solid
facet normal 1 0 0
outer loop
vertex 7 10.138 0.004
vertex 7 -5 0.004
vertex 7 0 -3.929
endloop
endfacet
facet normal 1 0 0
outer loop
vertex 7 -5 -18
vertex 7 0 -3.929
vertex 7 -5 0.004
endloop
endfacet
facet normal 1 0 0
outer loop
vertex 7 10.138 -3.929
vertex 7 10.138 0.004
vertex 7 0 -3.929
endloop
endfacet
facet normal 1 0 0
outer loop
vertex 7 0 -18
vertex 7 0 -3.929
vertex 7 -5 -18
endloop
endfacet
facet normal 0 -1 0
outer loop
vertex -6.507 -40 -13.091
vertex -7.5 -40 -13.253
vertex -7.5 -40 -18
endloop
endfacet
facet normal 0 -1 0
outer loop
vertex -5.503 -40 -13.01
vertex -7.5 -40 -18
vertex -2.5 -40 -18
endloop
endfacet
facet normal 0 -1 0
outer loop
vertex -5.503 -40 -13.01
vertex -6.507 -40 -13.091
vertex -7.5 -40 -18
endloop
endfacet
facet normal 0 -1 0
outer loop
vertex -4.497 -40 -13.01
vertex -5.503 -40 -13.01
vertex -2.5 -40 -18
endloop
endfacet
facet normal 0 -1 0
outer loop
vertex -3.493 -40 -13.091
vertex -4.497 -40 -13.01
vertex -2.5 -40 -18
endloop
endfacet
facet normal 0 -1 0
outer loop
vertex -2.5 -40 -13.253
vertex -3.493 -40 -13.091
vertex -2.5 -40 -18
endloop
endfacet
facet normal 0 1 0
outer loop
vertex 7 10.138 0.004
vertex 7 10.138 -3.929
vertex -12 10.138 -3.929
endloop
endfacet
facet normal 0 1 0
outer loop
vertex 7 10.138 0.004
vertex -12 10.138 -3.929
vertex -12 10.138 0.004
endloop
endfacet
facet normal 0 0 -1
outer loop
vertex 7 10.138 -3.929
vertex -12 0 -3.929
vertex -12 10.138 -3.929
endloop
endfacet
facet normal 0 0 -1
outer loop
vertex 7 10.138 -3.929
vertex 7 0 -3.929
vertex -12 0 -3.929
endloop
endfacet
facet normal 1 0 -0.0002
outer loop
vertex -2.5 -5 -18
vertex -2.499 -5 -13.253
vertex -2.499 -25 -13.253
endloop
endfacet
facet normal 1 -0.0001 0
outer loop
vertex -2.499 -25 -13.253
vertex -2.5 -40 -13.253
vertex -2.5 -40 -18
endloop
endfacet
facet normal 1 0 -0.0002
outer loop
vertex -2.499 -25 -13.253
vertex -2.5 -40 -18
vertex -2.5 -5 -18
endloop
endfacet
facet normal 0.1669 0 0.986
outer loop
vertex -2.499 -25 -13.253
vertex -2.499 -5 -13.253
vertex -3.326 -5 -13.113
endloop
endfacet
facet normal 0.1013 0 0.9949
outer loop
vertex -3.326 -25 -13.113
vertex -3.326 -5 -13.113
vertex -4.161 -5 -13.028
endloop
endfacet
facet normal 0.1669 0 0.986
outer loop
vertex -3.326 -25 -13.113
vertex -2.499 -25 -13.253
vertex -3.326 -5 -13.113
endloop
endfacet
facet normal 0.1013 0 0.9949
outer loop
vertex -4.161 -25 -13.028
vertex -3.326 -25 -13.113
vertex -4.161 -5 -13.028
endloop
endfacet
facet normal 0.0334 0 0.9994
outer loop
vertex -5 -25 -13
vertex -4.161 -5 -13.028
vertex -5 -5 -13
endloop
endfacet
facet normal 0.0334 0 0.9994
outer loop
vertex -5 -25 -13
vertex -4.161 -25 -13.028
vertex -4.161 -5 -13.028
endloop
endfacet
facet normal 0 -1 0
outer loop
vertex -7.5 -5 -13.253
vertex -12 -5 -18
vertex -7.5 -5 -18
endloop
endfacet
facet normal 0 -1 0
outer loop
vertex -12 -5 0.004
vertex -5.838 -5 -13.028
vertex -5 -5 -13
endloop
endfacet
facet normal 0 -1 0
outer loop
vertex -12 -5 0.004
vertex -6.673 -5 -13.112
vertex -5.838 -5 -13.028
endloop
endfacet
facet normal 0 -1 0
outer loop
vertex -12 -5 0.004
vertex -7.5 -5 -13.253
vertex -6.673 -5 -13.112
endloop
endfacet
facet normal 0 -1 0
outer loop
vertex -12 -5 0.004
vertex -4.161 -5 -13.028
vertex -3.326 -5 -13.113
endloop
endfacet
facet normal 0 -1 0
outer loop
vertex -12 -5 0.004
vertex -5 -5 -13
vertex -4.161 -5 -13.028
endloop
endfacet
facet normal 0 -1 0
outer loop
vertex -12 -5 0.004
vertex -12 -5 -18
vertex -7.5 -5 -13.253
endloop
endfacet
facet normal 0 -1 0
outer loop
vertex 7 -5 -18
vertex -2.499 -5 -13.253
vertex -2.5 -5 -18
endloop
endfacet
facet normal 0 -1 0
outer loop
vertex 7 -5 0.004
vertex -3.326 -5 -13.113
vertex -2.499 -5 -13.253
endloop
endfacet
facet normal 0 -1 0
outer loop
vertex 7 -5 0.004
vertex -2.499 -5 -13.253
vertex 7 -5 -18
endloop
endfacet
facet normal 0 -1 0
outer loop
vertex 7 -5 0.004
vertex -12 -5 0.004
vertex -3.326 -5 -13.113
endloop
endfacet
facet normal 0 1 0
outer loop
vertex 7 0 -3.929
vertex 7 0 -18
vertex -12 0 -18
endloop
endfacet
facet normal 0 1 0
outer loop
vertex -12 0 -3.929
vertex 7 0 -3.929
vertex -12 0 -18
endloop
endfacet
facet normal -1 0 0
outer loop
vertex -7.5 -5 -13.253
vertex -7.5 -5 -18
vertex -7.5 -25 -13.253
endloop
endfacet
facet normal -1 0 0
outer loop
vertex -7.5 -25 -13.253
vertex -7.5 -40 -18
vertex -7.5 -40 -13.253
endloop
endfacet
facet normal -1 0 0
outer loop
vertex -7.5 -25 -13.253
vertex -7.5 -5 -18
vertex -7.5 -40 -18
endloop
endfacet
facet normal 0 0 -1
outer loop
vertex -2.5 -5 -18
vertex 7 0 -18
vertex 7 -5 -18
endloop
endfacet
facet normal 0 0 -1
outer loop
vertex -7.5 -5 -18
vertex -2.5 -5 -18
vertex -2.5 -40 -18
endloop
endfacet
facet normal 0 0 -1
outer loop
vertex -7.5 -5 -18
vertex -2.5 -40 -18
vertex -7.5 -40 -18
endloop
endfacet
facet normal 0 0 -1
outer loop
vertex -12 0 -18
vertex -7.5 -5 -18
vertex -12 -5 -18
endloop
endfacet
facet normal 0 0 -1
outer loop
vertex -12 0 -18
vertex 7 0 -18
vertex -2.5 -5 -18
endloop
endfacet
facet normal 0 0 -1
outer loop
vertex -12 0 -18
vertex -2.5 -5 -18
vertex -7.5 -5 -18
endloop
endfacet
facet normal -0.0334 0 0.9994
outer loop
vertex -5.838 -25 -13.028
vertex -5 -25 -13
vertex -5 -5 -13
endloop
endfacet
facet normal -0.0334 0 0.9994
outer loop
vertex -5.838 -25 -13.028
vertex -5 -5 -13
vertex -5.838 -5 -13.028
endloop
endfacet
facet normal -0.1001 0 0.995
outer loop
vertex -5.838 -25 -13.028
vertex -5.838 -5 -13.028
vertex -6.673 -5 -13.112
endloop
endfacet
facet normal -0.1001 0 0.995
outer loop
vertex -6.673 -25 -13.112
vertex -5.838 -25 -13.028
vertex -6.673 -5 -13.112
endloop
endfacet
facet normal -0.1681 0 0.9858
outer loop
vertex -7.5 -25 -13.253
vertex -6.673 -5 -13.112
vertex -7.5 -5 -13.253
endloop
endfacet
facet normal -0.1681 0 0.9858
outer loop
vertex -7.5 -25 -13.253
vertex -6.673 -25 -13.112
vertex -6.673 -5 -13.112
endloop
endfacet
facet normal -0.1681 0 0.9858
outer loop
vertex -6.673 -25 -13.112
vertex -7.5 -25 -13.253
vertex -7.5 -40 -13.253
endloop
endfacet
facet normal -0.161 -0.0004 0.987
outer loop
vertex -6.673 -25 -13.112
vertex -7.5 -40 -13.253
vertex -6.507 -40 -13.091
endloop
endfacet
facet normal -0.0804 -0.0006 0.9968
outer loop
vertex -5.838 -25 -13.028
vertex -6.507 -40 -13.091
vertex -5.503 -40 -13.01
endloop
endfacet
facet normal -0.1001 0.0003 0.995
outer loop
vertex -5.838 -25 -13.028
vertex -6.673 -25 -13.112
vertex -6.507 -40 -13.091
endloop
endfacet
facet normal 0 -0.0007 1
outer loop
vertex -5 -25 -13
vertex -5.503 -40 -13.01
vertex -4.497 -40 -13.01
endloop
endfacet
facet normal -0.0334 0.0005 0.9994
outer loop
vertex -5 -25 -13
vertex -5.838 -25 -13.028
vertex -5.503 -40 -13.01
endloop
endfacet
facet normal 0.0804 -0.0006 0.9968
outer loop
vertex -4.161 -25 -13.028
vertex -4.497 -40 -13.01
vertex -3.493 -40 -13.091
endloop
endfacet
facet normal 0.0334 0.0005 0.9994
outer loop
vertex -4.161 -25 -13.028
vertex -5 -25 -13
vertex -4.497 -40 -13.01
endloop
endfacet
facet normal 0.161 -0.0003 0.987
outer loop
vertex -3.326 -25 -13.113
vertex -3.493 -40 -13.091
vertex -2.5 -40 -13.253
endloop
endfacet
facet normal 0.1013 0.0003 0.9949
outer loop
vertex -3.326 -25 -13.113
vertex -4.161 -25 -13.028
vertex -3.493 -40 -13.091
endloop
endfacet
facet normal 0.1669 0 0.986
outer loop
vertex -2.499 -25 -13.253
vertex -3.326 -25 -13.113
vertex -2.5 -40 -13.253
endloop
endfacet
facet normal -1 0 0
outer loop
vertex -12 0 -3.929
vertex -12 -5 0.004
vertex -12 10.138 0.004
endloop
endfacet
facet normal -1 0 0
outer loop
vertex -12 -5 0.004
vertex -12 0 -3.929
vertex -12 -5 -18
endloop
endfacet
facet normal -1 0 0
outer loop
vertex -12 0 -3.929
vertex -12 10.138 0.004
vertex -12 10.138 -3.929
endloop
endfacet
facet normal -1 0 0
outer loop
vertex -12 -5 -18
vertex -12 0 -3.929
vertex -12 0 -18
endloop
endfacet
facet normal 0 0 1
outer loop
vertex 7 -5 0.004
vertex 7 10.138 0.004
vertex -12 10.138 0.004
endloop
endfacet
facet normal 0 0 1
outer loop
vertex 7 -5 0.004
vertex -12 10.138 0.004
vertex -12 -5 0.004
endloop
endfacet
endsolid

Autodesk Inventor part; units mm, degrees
ref_plane "YZ Plane" through (0, 0, 0) normal (1, 0, 0) x (0, 1, 0)
ref_plane "XZ Plane" through (0, 0, 0) normal (0, 1, 0) x (-1, 0, 0)
ref_plane "XY Plane" through (0, 0, 0) normal (0, 0, 1) x (1, 0, 0)
sketch "Sketch1" plane through (0, 0, 0) normal (0, 1, 0) x (-1, 0, 0)
  line L0 (0, 0) -> (0, -13)
  line L1 (0, -13) -> (-2, -13)
  line L2 (-2, -13) -> (-2, 2)
  line L3 (-2, 2) -> (12, 2)
  line L4 (12, 2) -> (12, -13)
  line L5 (12, -13) -> (10, -13)
  line L6 (10, -13) -> (10, 0)
  line L7 (10, 0) -> (0, 0)
  dimension "d0" = 13
  dimension "d1" = 2
  dimension "d2" = 15
  dimension "d3" = 14
  dimension "d4" = 2
  dimension "d5" = 13
ref_plane "Work Plane2" through (-12, 0, 2) normal (0, 0, 1) x (1, 0, 0)
sketch "Sketch2" plane through (-12, 0, 2) normal (0, 0, 1) x (1, 0, 0)
  line L0 (0, 20) -> (14, 20) projected
  line L1 (7, 20) -> (7, 0)
  line L2 (12, 0) -> (2, 0) projected
  line L3 (7, 0) -> (7, 4.5)
  circle A0 centre (7, 4.5) radius 1.75
  line L4 (7, 4.5) -> (7, 15.5)
  circle A1 centre (7, 15.5) radius 1.75
  dimension "d8" = 4.5
  dimension "d9" = 3.5
  dimension "d10" = 11
  dimension "d11" = 3.5
ref_plane "Work Plane5" through (0, 0, 0) normal (0, -1, 0) x (1, 0, 0)
sketch "Sketch3" plane through (0, 0, 0) normal (0, -1, 0) x (1, 0, 0)
  line L0 (-12, 2) -> (2, 2) projected
  line L1 (-12, -13) -> (-12, 2) projected
  line L2 (2, 2) -> (-12, 2)
  line L3 (-12, 2) -> (-12, -13)
  line L4 (-12, -13) -> (2, -13)
  line L5 (2, -13) -> (2, 2)
  point P0 (0, 0)
extrude "Extrusion3" add sketch "Sketch3" along normal blind 5
ref_plane "Work Plane6" through (0, -5, 0) normal (0, -1, 0) x (1, 0, 0)
sketch "Sketch4" plane through (0, -5, 0) normal (0, -1, 0) x (1, 0, 0)
  line L0 (-12, -13) -> (2, -13) projected
  line L1 (2, -13) -> (-12, -13)
  line L2 (-12, -13) -> (-12, -8)
  line L3 (-12, -8) -> (2, -8)
  line L4 (2, -8) -> (2, -13)
  point P0 (0, 0)
  dimension "d16" = 14
  dimension "d17" = 5
ref_plane "Work Plane1" through (0, -25, 0) normal (0, -1, 0) x (1, 0, 0)
sketch "Sketch5" plane through (0, -25, 0) normal (0, -1, 0) x (1, 0, 0)
  line L0 (2, -8) -> (2, -13) projected
  line L1 (-12, -13) -> (2, -13) projected
  line L2 (-5, -13) -> (-5, 2)
  line L3 (2, 2) -> (-12, 2) projected
  line L4 (-5, -13) -> (-2.5, -13)
  line L5 (-10, -13) -> (0, -13) projected
  line L6 (-2.5, -13) -> (-2.5, -18)
  line L7 (-2.5, -18) -> (-7.5, -18)
  line L8 (-7.5, -18) -> (-7.5, -13)
  line L9 (-2.5, -13) -> (-7.5, -13)
  line L10 (-5, -13) -> (-5, -25.5)
  arc A0 (-2.4988, -13.2528) -> (-5, -13) centre (-5, -25.5) ccw
  arc A1 (-5, -13) -> (-7.5, -13.2526) centre (-5, -25.5) ccw
  point P0 (0, 0)
  point P1 (-2.5, -13.2526)
  dimension "d25" = 2.5
  dimension "d26" = 5
  dimension "d27" = 5
  dimension "d31" = 12.5
extrude "Extrusion4" add sketch "Sketch5" against normal blind 20 contours A0 L6 L7 L10 | L10 L7 L8 A1
ref_plane "Work Plane3" through (2, 20, -13) normal (0, 0, -1) x (-1, 0, 0)
sketch "Sketch6" plane through (2, 20, -13) normal (0, 0, -1) x (-1, 0, 0)
  line L0 (0, -25) -> (0, 0) projected
  line L1 (14, -25) -> (7, -25) projected
  line L2 (0, -20) -> (14, -20)
  line L3 (14, -20) -> (14, -25)
  line L4 (14, -25) -> (0, -25)
  line L5 (0, -25) -> (0, -20)
  point P0 (2, -20)
  point P1 (9.5, -25)
  point P2 (9.5, -25)
extrude "Extrusion5" add sketch "Sketch6" along normal up to surface (5 mm away)
ref_plane "Work Plane4" through (-10, 20, -13) normal (0, 0, -1) x (-1, 0, 0)
sketch "Sketch9" plane through (0, -25, 0) normal (0, -1, 0) x (1, 0, 0)
  arc A0 (-2.5, -13.2526) -> (-7.5, -13.2526) centre (-5, -25.5) ccw projected
  line L0 (-7.5, -13.2526) -> (-7.5, -18) projected
  line L1 (-7.5, -18) -> (-2.5, -18) projected
  line L2 (-2.5, -18) -> (-2.5, -13.2526) projected
  line L3 (-2.5, -18) -> (-2.5, -13.2526)
  line L4 (-2.5, -11.2171) -> (-2.5, -18) projected
  line L5 (-2.5, -18) -> (-7.5, -18)
  line L6 (2, -18) -> (-12, -18) projected
  line L7 (-7.5, -18) -> (-7.5, -13.2526)
  point P0 (0, 0)
extrude "Extrusion7" add sketch "Sketch9" along normal blind 15
sketch "Sketch11" plane through (2, 0, -18) normal (0, 0, -1) x (-1, 0, 0)
  line L0 (9.5, -5) -> (9.5, -40) projected
  line L1 (14, -5) -> (9.5, -5) projected
  line L2 (14, 0) -> (14, -5) projected
  line L3 (0, 0) -> (14, 0) projected
  line L4 (0, -5) -> (0, 0) projected
  line L5 (4.5, -5) -> (0, -5) projected
  line L6 (4.5, -5) -> (4.5, -40) projected
  line L7 (9.5, -40) -> (4.5, -40) projected
  line L8 (9.5, -5) -> (4.5, -5)
  line L9 (0, -5) -> (14, -5) projected
  line L10 (0, -5) -> (-5, -5)
  line L11 (-5, -5) -> (-5, 0)
  line L12 (0, -5) -> (0, 0) projected
  line L13 (-5, 0) -> (0, 0)
  line L14 (14, -5) -> (19, -5)
  line L15 (19, -5) -> (19, 0)
  line L16 (19, 0) -> (14, 0)
  point P0 (2, 0)
  dimension "d39" = 5
  dimension "d40" = 5
extrude "Extrusion9" add sketch "Sketch11" against normal up to surface (20 mm away) contours L10 L11 L13 L4
sketch "Sketch12" plane through (7, -5, -18) normal (1, 0, 0) x (0, 0, -1)
  line L0 (-14.0041, 5.1427) -> (-14.0041, 5) construction
  line L1 (-20, 5) -> (0, 5) construction
  line L2 (-14.0041, 5) -> (-18.0041, 5) construction
  line L3 (-20, 0) -> (0, 0) projected
  line L4 (-18.0041, 5) -> (-20, 5)
  line L5 (-20, 5) -> (-20, 0)
  line L6 (-20, 0) -> (-18.0041, 0)
  line L7 (-18.0041, 0) -> (-18.0041, 5)
  point P0 (-18, 5)
  dimension "d43" = 4
extrude "Extrusion10" cut sketch "Sketch12" against normal through all
sketch "Sketch13" plane through (7, -5, -18) normal (1, 0, 0) x (0, 0, -1)
  line L0 (0, 5) -> (-18.0041, 5) projected
  line L1 (-18.0041, 5) -> (-14.0707, 5)
  line L2 (-14.0707, 5) -> (-14.0707, 15.1381)
  line L3 (-14.0707, 15.1381) -> (-18.0041, 15.1381)
  line L4 (-18.0041, 15.1381) -> (-18.0041, 5)
  point P0 (-18, 5)
extrude "Extrusion11" add sketch "Sketch13" against normal up to surface (19 mm away)
equation "\"d41\" = d40"
